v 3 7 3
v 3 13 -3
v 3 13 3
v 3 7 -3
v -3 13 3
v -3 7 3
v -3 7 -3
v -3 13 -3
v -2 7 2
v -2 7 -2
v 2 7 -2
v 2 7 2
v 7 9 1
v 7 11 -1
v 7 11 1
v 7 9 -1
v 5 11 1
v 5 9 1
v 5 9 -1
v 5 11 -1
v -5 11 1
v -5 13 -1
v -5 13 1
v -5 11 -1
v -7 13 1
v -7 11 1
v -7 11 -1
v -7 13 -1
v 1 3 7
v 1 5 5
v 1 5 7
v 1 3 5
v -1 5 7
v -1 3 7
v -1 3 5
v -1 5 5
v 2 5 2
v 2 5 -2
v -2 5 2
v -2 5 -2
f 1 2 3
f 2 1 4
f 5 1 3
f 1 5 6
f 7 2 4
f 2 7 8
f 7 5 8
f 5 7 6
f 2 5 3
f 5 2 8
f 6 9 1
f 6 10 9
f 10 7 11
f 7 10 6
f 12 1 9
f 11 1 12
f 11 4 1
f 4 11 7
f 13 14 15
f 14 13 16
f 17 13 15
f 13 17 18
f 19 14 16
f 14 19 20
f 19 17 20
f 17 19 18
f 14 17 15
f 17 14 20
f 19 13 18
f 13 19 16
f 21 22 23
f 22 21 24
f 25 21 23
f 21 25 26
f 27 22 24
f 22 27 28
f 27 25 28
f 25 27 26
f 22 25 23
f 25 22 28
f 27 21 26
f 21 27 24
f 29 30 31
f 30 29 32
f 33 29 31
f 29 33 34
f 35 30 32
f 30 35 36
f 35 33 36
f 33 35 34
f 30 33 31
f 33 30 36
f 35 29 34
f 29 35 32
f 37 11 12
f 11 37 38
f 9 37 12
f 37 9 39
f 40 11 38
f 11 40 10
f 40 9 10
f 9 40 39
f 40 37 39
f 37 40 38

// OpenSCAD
// file: lib.scad
// Voxcraft box-model library (OpenSCAD).
//
// Conventions: 1 unit = 1 texture pixel = 1/16 block. Origin = entity feet centre. +Y up,
// the model faces -Z (forward). Pivots are in model space.
//
// vx_bone() and vx_box() both produce geometry (so the model can be previewed/rendered and its
// geometry validated) AND echo a machine-readable record that tools/scad_export.py turns into
// the runtime box model. The .scad files are the single editable source of truth.

// Declare a bone: name, parent ("" = root), pivot point the bone rotates around.
module vx_bone(name, parent, pivot) {
    echo("VXBONE", name, parent, pivot);
    %translate(pivot) sphere(0.5, $fn = 6);   // preview-only marker
}

// A textured box attached to a bone. tex: texture for all faces; front: texture for the -Z face.
module vx_box(bone, min, size, tex, front = "") {
    echo("VXBOX", bone, min, size, tex, front == "" ? tex : front);
    translate(min) cube(size);
}
// main file
// Cinderwisp: a floating ember spirit of the Hollow; keeps its distance and hurls ember bolts.
// Original Voxcraft creature.
include <lib.scad>

vx_bone("body", "", [0, 10, 0]);
vx_bone("shard_a", "body", [0, 10, 0]);
vx_bone("shard_b", "body", [0, 10, 0]);
vx_bone("shard_c", "body", [0, 10, 0]);
vx_bone("head", "body", [0, 10, 0]);

vx_box("head", [-3, 7, -3], [6, 6, 6], "cinderwisp_core", "cinderwisp_face");
vx_box("shard_a", [5, 9, -1], [2, 2, 2], "cinderwisp_shard");
vx_box("shard_b", [-7, 11, -1], [2, 2, 2], "cinderwisp_shard");
vx_box("shard_c", [-1, 3, 5], [2, 2, 2], "cinderwisp_shard");
vx_box("body", [-2, 5, -2], [4, 2, 4], "cinderwisp_shard");
